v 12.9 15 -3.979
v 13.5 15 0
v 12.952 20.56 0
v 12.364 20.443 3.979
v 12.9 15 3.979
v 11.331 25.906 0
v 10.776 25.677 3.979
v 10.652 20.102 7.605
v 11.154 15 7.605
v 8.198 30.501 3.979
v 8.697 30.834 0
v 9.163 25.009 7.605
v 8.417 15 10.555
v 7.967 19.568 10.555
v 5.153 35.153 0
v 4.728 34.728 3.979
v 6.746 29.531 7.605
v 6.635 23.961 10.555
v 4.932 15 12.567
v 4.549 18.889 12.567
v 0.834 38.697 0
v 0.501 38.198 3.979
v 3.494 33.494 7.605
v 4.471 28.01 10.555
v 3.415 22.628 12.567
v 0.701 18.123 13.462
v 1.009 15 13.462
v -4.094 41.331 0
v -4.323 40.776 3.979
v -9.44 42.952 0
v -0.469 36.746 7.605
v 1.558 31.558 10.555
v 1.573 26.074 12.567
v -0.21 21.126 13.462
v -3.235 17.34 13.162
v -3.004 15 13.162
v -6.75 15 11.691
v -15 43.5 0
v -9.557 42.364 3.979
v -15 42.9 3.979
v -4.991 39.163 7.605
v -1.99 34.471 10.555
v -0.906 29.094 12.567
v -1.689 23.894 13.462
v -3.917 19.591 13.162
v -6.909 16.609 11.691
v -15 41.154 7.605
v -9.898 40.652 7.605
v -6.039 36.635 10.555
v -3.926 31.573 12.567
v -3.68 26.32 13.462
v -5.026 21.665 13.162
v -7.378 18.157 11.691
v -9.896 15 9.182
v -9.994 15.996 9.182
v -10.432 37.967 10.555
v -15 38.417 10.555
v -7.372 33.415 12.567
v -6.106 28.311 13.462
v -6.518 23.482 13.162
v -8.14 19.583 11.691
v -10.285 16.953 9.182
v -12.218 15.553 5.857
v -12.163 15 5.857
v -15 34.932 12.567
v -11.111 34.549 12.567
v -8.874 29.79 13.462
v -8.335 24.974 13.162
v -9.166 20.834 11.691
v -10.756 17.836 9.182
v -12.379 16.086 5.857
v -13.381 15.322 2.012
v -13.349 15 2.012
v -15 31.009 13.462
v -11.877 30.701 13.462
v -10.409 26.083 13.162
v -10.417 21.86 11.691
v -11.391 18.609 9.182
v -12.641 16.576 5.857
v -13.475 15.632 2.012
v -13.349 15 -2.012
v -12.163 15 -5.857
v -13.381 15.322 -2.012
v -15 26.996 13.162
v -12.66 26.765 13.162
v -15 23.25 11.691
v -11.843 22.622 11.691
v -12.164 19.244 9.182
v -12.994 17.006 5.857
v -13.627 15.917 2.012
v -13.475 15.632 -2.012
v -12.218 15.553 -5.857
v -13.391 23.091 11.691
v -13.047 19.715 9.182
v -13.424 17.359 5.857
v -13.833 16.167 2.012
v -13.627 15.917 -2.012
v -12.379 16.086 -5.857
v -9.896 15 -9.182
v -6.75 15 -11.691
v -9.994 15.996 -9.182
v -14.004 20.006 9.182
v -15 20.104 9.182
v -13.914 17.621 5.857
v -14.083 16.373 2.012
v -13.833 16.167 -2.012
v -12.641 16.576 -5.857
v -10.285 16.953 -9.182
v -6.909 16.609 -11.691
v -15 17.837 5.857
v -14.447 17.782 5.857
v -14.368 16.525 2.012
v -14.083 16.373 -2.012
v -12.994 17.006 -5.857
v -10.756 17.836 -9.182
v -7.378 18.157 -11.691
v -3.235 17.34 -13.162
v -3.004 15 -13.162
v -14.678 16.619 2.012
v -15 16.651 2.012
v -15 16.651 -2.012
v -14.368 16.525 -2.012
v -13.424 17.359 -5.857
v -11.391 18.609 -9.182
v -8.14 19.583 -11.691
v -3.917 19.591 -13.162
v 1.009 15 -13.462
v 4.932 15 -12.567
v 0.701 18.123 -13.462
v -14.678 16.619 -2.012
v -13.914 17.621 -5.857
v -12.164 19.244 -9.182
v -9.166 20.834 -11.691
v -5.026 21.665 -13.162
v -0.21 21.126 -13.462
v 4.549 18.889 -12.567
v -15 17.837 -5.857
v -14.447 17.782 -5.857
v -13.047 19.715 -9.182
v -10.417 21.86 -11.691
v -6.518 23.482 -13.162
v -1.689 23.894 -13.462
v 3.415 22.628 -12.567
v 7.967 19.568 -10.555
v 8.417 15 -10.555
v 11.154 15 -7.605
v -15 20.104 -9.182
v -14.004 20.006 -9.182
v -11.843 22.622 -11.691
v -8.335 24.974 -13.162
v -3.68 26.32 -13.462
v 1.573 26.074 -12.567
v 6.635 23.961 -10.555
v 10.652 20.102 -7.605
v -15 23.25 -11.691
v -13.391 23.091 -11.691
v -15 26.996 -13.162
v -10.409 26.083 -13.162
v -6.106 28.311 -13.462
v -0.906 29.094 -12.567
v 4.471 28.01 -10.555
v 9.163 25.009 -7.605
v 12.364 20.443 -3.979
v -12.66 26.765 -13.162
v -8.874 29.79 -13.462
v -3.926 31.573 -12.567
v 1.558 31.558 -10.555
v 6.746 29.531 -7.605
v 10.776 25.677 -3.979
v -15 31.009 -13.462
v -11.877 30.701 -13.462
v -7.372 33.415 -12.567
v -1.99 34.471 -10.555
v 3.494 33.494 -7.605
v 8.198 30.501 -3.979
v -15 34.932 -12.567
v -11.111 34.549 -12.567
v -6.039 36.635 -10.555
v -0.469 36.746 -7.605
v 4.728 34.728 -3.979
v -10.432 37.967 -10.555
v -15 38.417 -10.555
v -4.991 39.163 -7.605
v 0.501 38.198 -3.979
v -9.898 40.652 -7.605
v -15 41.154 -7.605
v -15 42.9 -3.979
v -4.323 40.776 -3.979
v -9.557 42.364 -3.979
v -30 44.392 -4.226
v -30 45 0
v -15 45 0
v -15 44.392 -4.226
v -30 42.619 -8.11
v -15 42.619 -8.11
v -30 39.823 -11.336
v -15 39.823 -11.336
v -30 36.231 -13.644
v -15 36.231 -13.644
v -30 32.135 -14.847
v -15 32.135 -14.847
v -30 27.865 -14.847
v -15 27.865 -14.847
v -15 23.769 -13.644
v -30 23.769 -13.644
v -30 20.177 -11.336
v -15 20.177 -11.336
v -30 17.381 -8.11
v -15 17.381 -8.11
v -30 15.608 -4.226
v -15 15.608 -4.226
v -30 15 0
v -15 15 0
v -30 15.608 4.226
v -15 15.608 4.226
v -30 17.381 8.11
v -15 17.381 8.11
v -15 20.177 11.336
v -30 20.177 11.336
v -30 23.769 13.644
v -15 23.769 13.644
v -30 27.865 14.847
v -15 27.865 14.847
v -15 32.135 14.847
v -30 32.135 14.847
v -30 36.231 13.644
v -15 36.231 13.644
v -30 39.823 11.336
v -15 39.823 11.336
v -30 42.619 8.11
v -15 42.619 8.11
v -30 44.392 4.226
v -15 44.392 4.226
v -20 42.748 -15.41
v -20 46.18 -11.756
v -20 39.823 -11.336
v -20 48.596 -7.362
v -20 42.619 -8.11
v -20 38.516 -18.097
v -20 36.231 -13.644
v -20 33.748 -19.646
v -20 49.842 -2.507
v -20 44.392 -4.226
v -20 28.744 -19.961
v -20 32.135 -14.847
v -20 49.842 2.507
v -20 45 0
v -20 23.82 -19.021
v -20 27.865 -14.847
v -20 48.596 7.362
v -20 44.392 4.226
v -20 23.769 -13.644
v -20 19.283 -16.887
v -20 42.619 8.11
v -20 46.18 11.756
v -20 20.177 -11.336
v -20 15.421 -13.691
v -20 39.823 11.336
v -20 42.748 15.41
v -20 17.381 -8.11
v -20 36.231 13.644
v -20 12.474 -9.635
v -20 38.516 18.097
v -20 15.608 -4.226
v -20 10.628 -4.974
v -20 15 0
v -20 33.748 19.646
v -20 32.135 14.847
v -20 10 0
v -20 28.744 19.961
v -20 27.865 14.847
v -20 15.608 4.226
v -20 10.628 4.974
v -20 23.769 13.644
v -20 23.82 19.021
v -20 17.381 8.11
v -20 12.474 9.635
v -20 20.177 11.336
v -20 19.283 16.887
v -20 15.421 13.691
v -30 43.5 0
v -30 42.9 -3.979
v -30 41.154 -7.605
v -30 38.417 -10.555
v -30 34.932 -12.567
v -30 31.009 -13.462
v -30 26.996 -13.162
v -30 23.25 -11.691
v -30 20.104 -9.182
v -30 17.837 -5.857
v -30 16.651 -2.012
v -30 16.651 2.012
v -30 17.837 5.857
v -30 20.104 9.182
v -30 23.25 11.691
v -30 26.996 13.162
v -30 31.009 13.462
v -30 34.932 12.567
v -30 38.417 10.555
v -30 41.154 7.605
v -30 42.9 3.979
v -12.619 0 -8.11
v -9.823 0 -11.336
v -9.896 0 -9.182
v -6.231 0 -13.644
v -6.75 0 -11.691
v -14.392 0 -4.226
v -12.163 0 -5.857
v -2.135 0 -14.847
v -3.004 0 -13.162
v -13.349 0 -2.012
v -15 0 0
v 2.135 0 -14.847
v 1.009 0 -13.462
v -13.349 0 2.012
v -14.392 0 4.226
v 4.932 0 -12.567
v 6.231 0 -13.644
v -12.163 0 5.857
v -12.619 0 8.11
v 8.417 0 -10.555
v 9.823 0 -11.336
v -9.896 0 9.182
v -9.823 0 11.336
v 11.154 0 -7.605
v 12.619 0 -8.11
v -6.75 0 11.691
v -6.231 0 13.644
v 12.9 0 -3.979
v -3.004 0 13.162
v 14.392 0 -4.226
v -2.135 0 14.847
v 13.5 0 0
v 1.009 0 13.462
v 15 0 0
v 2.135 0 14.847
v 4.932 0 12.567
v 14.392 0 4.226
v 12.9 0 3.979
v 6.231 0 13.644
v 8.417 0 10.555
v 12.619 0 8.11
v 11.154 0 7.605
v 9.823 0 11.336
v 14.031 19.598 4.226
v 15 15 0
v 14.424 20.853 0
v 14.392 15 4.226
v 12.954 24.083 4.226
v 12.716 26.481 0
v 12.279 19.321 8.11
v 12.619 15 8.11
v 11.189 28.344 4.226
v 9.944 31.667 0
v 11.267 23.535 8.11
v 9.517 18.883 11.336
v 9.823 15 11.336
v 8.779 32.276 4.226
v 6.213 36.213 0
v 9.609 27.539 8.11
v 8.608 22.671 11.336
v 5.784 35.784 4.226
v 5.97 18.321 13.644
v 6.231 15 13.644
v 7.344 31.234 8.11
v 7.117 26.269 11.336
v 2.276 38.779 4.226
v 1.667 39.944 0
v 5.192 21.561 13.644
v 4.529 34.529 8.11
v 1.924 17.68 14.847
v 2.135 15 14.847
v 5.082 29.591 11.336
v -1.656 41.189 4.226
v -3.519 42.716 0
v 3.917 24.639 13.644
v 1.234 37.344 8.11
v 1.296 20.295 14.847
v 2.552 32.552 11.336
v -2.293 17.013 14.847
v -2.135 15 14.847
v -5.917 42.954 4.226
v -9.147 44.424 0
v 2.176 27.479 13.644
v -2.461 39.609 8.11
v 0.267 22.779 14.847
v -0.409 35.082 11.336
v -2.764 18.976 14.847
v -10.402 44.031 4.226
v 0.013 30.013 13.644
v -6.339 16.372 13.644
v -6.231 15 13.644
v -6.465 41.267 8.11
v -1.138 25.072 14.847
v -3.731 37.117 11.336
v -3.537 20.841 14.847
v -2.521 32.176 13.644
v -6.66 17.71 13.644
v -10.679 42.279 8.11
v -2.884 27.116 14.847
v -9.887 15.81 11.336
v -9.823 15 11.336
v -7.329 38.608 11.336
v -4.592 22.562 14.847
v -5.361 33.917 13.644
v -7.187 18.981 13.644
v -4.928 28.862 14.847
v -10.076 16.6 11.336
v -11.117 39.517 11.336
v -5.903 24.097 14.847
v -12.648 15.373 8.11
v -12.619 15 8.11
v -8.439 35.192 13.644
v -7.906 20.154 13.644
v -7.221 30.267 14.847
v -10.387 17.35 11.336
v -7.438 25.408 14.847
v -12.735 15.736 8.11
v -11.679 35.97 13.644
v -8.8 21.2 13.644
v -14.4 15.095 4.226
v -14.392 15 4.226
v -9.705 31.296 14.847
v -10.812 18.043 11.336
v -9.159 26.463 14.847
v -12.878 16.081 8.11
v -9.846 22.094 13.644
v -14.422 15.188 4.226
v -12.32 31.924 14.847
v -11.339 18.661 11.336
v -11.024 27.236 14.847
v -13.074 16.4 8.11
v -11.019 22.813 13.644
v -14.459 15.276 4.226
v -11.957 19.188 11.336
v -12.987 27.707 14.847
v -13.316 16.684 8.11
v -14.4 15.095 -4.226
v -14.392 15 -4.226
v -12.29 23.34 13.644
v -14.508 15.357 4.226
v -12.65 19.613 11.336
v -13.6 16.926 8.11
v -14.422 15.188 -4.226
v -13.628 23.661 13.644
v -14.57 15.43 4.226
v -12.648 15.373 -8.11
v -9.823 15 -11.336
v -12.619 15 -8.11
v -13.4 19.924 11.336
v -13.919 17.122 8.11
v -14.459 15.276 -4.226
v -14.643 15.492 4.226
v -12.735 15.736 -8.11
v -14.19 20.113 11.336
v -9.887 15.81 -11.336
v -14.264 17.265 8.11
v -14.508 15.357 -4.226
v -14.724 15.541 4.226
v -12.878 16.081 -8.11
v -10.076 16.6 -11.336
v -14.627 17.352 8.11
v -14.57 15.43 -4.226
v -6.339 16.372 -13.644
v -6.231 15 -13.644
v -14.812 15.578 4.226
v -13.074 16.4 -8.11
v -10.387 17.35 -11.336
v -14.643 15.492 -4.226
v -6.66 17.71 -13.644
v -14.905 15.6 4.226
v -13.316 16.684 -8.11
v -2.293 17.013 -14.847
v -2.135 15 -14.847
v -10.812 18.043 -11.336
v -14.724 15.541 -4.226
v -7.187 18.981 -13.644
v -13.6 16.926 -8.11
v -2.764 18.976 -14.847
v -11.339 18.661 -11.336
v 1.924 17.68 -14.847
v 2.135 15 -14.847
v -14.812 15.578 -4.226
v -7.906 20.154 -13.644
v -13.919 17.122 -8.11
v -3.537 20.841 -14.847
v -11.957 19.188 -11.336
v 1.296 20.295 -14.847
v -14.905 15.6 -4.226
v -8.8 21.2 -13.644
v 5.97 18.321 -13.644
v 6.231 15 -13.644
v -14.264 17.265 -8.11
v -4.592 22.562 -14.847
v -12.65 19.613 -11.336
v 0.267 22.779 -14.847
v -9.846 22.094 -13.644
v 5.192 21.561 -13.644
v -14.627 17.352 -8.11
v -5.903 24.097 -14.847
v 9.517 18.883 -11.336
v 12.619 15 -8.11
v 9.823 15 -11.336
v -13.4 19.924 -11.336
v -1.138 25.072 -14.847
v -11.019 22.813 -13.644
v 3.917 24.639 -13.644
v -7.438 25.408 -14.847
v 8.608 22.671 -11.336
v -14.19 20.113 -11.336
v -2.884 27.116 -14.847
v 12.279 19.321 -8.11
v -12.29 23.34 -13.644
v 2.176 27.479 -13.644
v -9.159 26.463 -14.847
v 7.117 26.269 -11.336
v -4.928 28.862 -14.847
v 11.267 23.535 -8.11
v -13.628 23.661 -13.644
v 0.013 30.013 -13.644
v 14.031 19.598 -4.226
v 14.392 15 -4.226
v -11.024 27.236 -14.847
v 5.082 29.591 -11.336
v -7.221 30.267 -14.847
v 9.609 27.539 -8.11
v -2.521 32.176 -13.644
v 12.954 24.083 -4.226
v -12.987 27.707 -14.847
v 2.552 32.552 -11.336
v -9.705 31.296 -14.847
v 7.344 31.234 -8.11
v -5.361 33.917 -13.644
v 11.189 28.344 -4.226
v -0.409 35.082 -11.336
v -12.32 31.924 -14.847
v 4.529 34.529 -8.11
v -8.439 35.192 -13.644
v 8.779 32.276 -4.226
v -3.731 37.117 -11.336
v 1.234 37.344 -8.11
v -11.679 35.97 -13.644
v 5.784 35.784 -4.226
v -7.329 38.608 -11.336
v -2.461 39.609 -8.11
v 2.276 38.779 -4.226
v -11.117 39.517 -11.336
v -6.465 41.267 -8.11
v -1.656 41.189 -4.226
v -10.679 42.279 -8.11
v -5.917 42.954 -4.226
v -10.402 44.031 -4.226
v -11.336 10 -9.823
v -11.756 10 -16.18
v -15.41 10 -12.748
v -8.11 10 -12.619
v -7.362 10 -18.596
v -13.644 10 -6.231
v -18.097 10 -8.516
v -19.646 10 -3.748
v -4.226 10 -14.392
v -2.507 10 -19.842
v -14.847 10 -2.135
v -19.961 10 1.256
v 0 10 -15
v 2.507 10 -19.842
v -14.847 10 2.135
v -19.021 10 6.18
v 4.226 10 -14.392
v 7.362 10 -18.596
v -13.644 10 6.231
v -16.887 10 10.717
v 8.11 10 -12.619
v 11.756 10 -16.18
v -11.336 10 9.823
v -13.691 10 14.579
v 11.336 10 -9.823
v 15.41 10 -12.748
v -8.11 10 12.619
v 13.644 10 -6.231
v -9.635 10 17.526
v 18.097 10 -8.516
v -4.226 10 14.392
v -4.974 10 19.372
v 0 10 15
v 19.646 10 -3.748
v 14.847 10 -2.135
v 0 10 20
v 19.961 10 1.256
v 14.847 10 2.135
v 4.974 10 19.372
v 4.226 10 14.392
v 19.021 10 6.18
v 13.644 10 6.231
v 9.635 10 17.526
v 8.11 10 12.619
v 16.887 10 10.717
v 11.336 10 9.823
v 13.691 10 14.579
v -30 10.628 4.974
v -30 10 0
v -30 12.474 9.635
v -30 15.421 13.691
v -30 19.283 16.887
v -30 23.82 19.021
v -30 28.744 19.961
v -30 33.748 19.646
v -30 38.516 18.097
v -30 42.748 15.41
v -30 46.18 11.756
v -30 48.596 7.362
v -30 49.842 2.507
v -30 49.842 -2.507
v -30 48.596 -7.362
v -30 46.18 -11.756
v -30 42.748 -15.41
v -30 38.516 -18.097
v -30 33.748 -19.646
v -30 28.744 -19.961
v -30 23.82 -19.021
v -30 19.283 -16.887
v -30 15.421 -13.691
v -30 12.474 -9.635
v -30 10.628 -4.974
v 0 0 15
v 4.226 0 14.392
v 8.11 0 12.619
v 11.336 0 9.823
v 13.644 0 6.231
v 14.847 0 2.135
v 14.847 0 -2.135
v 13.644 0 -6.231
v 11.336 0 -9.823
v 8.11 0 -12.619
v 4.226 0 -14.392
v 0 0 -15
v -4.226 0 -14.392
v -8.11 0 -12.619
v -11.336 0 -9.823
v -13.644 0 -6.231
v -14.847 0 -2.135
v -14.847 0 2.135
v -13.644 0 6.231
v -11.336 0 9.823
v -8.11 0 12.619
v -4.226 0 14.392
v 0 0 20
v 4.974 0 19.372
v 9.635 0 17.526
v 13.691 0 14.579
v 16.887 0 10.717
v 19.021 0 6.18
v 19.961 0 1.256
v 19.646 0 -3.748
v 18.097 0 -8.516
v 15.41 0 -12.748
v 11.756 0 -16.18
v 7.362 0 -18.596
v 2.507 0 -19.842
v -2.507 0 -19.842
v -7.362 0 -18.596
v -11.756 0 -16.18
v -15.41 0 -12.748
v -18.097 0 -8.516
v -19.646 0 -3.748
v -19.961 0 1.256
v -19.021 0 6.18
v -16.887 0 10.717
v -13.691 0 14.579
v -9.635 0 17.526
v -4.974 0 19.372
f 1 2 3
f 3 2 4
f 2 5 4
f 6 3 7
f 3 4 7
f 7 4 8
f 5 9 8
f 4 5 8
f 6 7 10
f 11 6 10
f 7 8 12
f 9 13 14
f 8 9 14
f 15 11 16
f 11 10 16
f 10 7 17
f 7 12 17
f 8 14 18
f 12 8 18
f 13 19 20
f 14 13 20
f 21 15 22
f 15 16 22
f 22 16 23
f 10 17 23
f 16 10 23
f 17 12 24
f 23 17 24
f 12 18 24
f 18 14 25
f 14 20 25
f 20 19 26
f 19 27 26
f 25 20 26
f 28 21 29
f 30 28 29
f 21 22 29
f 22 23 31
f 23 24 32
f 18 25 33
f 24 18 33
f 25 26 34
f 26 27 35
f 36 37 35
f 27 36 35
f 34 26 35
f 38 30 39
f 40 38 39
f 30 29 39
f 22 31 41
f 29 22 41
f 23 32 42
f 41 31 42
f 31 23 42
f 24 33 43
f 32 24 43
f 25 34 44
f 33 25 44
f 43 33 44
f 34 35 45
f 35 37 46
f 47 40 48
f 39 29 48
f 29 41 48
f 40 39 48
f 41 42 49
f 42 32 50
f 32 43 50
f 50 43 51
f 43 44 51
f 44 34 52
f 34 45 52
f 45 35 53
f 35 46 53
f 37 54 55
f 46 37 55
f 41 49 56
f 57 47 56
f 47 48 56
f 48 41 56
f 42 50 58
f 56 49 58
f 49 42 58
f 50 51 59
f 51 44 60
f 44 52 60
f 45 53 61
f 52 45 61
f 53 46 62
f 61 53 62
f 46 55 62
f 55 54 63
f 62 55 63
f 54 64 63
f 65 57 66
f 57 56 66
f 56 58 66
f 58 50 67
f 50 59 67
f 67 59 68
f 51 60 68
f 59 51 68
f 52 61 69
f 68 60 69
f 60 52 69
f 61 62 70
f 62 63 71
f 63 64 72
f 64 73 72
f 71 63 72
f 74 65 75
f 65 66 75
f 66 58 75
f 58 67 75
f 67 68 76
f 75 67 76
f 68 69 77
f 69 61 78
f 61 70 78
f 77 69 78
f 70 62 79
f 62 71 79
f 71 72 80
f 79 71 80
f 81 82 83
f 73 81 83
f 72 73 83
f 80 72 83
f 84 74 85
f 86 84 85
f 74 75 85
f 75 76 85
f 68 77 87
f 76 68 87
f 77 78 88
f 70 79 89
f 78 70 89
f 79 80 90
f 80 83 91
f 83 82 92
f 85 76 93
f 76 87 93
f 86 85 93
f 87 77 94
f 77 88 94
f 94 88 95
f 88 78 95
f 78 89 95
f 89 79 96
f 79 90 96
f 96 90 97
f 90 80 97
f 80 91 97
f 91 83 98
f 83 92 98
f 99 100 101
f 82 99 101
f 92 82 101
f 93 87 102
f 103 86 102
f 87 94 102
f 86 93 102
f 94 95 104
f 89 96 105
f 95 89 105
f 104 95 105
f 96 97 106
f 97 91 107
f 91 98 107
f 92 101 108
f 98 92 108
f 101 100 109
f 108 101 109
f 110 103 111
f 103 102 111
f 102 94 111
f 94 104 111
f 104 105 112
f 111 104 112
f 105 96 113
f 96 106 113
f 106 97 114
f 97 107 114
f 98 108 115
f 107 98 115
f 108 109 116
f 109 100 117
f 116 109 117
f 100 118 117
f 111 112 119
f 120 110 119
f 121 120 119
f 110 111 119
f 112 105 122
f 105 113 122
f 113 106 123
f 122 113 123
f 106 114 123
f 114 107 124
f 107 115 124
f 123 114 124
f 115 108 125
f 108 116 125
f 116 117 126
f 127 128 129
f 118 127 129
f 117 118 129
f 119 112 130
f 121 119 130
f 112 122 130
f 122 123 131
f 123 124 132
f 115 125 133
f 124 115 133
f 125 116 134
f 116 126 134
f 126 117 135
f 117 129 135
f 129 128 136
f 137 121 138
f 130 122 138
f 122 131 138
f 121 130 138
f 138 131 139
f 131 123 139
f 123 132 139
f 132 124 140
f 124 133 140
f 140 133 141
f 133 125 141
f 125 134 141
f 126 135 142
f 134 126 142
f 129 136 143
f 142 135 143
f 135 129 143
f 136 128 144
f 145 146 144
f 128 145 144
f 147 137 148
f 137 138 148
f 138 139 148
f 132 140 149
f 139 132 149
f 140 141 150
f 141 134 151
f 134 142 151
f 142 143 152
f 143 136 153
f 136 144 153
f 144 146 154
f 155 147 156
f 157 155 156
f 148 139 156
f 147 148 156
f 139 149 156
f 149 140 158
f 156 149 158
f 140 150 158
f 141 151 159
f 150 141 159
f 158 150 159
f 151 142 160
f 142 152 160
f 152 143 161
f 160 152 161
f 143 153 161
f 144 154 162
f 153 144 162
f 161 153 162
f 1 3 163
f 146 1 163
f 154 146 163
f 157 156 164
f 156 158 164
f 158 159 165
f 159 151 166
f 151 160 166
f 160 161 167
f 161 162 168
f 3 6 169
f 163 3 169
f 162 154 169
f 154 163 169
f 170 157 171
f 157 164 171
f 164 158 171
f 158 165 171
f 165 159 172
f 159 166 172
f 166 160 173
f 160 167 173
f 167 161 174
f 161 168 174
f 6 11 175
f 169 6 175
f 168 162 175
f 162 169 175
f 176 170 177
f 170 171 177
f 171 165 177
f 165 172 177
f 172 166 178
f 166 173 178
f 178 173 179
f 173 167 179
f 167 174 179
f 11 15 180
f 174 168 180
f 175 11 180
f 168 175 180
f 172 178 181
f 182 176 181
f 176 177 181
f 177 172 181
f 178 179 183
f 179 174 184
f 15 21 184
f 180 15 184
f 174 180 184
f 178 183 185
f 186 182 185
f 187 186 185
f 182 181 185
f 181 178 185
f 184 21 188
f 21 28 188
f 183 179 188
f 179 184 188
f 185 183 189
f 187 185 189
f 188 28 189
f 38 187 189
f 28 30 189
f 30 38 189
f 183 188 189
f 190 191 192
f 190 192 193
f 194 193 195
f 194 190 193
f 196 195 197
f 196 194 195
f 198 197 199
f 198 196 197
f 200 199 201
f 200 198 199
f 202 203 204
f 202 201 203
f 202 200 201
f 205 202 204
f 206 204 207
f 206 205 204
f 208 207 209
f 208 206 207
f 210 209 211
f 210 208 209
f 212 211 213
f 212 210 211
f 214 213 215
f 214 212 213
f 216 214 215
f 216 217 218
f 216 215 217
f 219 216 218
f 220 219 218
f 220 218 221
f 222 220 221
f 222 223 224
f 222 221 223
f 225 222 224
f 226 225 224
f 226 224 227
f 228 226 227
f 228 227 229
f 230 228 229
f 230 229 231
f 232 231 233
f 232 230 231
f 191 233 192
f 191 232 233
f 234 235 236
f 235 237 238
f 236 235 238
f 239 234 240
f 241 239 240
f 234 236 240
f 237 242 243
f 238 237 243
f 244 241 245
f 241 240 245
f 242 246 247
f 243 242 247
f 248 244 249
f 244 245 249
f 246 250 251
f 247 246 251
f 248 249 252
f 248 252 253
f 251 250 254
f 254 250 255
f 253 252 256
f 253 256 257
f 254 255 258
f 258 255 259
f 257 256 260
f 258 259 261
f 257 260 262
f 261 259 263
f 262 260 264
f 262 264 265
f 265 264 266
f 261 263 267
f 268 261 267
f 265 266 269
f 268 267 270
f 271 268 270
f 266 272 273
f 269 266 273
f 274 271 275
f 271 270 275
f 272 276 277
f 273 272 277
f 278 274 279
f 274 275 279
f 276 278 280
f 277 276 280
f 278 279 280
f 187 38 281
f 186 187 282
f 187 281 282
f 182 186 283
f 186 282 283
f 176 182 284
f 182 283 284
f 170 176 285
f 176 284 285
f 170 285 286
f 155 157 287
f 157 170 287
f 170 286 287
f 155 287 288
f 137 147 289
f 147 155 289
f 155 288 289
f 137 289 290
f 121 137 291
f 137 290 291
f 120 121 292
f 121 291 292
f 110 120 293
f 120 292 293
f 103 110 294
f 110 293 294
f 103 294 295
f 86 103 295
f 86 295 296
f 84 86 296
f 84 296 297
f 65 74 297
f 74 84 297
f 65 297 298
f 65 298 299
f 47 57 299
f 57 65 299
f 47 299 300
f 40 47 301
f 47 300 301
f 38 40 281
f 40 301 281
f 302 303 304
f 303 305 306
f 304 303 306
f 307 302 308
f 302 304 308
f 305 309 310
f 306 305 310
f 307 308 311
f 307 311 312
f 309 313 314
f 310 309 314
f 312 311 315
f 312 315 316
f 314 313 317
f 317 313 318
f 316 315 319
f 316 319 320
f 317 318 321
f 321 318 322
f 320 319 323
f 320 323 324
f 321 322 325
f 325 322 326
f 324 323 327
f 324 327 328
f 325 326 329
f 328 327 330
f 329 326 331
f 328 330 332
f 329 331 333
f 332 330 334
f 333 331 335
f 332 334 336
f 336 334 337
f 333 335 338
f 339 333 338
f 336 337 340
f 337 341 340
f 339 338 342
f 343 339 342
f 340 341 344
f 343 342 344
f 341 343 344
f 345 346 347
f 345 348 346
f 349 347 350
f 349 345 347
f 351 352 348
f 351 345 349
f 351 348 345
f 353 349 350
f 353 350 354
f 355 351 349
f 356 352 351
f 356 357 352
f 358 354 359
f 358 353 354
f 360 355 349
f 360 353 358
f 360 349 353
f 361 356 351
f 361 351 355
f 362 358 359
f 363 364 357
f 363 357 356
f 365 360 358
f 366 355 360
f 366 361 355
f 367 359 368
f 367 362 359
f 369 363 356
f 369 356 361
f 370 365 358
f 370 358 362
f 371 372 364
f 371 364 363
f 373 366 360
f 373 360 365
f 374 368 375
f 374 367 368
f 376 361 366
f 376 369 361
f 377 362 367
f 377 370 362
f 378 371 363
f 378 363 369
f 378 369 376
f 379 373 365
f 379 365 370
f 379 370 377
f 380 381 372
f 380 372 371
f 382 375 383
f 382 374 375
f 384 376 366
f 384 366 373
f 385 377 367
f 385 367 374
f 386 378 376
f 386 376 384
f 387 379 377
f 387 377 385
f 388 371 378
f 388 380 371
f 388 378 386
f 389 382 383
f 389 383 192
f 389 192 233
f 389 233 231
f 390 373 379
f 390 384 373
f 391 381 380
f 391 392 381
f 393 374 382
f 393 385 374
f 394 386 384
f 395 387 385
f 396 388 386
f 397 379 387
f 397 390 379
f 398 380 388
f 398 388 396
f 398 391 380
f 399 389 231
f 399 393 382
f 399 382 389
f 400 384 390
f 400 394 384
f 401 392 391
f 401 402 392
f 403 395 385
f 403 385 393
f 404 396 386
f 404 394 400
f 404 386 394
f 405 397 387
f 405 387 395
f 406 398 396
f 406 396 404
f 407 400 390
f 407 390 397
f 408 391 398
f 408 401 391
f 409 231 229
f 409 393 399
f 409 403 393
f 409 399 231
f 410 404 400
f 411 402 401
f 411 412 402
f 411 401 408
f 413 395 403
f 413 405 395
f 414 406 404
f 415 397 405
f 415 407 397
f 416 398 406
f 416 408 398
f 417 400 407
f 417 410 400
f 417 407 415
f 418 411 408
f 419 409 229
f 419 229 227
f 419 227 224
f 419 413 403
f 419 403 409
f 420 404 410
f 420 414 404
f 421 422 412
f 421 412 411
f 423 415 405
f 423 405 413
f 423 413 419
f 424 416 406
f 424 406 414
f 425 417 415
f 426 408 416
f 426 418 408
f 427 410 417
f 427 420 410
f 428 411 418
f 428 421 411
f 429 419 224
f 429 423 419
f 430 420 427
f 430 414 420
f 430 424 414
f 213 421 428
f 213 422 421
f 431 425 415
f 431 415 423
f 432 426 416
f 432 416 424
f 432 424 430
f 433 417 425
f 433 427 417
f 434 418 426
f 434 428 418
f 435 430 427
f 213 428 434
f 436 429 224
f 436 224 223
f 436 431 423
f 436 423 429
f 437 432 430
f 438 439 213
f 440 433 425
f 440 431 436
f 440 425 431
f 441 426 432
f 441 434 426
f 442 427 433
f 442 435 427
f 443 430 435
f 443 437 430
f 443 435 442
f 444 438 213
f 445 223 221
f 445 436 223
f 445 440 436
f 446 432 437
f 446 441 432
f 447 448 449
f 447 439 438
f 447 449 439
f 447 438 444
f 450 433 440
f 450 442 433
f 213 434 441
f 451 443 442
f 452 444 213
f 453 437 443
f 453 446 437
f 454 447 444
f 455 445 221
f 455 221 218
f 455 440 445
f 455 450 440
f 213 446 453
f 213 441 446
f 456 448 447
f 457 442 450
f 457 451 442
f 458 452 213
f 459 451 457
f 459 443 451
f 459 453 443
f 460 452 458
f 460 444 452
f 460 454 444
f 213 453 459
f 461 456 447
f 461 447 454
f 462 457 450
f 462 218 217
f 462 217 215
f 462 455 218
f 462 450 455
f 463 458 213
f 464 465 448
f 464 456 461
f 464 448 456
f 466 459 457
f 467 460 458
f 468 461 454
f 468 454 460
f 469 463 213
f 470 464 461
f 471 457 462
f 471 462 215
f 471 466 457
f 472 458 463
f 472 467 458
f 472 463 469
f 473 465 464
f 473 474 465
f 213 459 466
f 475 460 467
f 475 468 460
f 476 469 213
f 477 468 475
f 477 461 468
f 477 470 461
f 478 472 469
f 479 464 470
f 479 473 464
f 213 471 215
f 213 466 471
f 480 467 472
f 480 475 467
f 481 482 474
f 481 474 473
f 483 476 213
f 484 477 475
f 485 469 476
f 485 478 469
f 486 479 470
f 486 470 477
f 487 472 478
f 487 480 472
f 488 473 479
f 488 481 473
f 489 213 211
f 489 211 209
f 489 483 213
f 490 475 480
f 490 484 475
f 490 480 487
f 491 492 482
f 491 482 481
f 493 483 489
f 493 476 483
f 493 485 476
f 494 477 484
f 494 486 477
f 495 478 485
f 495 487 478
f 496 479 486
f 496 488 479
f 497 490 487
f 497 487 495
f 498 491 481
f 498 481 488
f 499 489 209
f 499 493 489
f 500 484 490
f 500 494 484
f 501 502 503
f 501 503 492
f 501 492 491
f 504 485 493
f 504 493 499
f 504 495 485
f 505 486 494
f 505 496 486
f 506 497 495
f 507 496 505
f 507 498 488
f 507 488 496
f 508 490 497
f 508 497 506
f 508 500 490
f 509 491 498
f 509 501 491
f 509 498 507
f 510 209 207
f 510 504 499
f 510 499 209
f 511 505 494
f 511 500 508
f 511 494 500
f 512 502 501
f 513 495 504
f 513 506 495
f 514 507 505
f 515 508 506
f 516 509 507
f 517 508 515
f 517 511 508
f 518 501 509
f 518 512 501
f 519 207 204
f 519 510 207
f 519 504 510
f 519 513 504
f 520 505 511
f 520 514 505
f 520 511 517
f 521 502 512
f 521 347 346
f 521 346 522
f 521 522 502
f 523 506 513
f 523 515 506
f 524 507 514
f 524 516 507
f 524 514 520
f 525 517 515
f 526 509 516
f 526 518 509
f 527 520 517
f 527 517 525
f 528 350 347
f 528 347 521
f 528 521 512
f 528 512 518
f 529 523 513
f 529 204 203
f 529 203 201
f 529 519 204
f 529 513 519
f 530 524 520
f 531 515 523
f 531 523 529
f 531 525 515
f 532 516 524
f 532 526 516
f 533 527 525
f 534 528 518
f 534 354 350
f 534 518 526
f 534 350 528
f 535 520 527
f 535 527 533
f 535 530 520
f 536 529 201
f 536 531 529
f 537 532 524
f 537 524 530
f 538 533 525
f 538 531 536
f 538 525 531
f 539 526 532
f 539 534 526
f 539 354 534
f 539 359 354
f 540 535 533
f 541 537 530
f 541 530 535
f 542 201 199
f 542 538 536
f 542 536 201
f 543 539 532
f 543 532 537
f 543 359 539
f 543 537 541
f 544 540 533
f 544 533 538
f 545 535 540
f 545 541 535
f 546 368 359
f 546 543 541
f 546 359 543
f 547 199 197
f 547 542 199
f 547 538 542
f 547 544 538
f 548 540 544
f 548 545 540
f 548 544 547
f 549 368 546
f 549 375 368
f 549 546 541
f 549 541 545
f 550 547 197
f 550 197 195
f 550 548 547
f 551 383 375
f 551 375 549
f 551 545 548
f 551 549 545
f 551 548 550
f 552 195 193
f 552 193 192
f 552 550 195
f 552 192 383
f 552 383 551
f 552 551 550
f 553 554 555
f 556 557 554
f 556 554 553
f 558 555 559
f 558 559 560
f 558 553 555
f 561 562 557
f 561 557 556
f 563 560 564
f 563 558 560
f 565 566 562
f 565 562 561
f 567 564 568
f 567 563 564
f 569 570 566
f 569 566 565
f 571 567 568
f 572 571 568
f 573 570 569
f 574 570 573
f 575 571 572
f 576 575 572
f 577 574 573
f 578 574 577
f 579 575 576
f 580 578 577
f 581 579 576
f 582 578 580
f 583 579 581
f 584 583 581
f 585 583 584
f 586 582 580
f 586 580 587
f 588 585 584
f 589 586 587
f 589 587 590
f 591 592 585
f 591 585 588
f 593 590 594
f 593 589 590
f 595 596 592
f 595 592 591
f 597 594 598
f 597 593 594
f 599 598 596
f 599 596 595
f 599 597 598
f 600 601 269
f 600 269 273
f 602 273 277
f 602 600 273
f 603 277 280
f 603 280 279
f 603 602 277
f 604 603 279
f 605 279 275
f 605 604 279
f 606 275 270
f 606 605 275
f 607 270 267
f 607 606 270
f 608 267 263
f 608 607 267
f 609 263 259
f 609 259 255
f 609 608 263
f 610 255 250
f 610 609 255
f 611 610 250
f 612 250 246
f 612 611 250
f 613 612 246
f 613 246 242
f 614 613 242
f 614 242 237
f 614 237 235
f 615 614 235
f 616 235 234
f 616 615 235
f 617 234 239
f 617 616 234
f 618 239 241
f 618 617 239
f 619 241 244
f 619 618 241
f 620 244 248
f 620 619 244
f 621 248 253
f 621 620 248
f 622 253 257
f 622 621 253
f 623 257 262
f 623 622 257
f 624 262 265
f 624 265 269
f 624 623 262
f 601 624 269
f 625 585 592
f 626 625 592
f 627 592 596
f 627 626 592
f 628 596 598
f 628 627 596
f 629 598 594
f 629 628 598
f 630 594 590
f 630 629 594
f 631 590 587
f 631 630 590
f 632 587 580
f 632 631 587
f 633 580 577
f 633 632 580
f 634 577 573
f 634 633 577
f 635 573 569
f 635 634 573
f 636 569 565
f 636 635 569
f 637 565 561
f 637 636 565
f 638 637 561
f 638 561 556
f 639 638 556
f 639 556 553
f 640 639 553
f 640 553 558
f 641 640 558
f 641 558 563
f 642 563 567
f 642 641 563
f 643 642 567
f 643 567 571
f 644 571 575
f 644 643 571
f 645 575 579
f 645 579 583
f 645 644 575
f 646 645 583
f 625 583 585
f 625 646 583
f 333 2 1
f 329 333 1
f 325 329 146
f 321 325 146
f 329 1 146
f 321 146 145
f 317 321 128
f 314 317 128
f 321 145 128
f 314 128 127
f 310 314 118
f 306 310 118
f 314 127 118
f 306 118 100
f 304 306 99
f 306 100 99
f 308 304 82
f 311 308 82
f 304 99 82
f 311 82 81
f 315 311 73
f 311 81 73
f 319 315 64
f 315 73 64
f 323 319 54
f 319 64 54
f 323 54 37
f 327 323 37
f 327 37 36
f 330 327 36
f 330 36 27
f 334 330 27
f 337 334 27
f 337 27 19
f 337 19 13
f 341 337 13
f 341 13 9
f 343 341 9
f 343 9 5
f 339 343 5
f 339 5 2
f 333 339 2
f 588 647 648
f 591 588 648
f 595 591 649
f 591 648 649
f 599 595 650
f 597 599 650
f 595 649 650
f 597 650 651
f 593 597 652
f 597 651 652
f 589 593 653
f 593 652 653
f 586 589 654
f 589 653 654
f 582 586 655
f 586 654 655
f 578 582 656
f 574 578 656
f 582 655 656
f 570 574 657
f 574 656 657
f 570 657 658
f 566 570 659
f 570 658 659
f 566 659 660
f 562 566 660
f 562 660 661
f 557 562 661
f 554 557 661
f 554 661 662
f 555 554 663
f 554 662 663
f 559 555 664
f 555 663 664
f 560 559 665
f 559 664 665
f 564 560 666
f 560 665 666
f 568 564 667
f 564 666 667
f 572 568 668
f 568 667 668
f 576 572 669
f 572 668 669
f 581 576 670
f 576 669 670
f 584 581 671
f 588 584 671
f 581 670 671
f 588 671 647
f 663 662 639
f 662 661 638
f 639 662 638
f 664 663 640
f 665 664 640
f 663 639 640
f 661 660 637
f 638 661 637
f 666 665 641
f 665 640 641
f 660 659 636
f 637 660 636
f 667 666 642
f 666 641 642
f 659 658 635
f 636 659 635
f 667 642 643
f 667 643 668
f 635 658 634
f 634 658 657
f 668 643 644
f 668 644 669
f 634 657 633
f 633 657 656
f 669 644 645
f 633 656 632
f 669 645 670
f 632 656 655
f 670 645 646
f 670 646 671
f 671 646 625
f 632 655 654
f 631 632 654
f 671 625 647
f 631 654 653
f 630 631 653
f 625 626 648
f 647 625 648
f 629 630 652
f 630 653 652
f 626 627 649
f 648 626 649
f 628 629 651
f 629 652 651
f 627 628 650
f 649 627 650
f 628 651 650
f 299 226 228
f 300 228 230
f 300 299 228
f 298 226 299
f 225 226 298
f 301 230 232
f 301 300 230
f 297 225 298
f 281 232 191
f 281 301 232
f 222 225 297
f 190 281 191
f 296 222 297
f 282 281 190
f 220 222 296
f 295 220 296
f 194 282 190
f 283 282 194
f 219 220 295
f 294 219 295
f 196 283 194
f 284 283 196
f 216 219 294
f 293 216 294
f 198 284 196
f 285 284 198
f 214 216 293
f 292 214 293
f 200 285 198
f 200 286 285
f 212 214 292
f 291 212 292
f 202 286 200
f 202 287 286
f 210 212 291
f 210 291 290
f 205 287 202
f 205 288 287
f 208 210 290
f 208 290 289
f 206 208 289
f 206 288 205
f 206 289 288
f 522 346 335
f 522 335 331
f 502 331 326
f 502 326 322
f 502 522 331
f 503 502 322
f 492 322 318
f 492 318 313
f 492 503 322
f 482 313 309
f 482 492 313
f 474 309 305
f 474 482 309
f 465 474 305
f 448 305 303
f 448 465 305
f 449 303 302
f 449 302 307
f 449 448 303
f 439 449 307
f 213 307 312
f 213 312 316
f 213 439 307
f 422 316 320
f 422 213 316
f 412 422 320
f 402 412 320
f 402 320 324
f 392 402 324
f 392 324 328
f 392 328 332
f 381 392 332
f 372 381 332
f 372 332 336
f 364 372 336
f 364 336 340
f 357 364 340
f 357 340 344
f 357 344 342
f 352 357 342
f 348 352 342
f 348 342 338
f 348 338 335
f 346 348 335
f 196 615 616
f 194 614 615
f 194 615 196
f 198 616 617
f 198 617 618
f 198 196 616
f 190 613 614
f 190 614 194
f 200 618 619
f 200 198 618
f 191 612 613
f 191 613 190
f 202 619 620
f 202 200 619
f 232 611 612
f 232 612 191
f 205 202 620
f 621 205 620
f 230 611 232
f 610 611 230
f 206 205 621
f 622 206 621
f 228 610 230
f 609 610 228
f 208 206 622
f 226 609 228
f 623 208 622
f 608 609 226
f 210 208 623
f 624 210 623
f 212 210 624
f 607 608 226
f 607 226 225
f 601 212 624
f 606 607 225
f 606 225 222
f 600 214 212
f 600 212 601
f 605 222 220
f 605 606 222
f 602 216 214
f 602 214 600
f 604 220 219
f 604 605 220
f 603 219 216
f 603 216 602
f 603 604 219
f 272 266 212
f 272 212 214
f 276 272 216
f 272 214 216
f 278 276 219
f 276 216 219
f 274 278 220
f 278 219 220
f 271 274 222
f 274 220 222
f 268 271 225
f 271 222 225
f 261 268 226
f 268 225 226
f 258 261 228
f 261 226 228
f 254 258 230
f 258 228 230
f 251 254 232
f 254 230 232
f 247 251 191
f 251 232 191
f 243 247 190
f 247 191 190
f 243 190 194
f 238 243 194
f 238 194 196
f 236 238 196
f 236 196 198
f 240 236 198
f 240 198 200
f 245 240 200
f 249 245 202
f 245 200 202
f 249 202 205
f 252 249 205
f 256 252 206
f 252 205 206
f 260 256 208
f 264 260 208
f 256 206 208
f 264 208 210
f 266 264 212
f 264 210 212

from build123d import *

# Parameters (mm, degrees)
SWEEP1_PROFILE_R     = 15
CUT_SWEEP1_PROFILE_R = 13.5
SKETCH11_R           = 20
SKETCH11_R_2         = 15
BOSS_EXTRUDE3_DEPTH  = 10
SKETCH27_R           = 20
SKETCH27_R_2         = 15
BOSS_EXTRUDE6_DEPTH  = 10


with BuildPart() as part:
    # Sweep1: sweep along a path in Sketch2
    with BuildLine(Plane.XY) as sweep1_path:
        Line((0, 0), (0, 15))
        ThreePointArc((0, 15), (-4.393398282, 25.606601718), (-15, 30))
        Line((-15, 30), (-30, 30))
    # Sweep1 profile (on start of the path) → Sweep1 (sweep)
    with BuildSketch(Plane(origin=(0, 0, 0), x_dir=(1, 0, 0), z_dir=(0, 1, 0))):
        Circle(SWEEP1_PROFILE_R)
    sweep(path=sweep1_path.line)

    # Cut-Sweep1: sweep along a path in Sketch2<2>
    with BuildLine(Plane.XY) as cut_sweep1_path:
        Line((0, 0), (0, 15))
        ThreePointArc((0, 15), (-4.393398282, 25.606601718), (-15, 30))
        Line((-15, 30), (-30, 30))
    # Cut-Sweep1 profile (on start of the path) → Cut-Sweep1 (sweep, cut)
    with BuildSketch(Plane(origin=(0, 0, 0), x_dir=(1, 0, 0), z_dir=(0, 1, 0))):
        Circle(CUT_SWEEP1_PROFILE_R)
    sweep(path=cut_sweep1_path.line, mode=Mode.SUBTRACT)


with BuildPart() as body_2:
    # Sketch11 → Boss-Extrude3 (new body)
    with BuildSketch(Plane(origin=(0, 0, 0), x_dir=(1, 0, 0), z_dir=(0, 1, 0))):
        Circle(SKETCH11_R)
        Circle(SKETCH11_R_2, mode=Mode.SUBTRACT)
    extrude(amount=BOSS_EXTRUDE3_DEPTH)


with BuildPart() as body_3:
    # Sketch27 → Boss-Extrude6 (new body)
    with BuildSketch(Plane.ZY.offset(30)):
        with Locations((0, 30)):
            Circle(SKETCH27_R)
        with Locations((0, 30)):
            Circle(SKETCH27_R_2, mode=Mode.SUBTRACT)
    extrude(amount=-BOSS_EXTRUDE6_DEPTH)


solid = Compound([part.part, body_2.part, body_3.part])
